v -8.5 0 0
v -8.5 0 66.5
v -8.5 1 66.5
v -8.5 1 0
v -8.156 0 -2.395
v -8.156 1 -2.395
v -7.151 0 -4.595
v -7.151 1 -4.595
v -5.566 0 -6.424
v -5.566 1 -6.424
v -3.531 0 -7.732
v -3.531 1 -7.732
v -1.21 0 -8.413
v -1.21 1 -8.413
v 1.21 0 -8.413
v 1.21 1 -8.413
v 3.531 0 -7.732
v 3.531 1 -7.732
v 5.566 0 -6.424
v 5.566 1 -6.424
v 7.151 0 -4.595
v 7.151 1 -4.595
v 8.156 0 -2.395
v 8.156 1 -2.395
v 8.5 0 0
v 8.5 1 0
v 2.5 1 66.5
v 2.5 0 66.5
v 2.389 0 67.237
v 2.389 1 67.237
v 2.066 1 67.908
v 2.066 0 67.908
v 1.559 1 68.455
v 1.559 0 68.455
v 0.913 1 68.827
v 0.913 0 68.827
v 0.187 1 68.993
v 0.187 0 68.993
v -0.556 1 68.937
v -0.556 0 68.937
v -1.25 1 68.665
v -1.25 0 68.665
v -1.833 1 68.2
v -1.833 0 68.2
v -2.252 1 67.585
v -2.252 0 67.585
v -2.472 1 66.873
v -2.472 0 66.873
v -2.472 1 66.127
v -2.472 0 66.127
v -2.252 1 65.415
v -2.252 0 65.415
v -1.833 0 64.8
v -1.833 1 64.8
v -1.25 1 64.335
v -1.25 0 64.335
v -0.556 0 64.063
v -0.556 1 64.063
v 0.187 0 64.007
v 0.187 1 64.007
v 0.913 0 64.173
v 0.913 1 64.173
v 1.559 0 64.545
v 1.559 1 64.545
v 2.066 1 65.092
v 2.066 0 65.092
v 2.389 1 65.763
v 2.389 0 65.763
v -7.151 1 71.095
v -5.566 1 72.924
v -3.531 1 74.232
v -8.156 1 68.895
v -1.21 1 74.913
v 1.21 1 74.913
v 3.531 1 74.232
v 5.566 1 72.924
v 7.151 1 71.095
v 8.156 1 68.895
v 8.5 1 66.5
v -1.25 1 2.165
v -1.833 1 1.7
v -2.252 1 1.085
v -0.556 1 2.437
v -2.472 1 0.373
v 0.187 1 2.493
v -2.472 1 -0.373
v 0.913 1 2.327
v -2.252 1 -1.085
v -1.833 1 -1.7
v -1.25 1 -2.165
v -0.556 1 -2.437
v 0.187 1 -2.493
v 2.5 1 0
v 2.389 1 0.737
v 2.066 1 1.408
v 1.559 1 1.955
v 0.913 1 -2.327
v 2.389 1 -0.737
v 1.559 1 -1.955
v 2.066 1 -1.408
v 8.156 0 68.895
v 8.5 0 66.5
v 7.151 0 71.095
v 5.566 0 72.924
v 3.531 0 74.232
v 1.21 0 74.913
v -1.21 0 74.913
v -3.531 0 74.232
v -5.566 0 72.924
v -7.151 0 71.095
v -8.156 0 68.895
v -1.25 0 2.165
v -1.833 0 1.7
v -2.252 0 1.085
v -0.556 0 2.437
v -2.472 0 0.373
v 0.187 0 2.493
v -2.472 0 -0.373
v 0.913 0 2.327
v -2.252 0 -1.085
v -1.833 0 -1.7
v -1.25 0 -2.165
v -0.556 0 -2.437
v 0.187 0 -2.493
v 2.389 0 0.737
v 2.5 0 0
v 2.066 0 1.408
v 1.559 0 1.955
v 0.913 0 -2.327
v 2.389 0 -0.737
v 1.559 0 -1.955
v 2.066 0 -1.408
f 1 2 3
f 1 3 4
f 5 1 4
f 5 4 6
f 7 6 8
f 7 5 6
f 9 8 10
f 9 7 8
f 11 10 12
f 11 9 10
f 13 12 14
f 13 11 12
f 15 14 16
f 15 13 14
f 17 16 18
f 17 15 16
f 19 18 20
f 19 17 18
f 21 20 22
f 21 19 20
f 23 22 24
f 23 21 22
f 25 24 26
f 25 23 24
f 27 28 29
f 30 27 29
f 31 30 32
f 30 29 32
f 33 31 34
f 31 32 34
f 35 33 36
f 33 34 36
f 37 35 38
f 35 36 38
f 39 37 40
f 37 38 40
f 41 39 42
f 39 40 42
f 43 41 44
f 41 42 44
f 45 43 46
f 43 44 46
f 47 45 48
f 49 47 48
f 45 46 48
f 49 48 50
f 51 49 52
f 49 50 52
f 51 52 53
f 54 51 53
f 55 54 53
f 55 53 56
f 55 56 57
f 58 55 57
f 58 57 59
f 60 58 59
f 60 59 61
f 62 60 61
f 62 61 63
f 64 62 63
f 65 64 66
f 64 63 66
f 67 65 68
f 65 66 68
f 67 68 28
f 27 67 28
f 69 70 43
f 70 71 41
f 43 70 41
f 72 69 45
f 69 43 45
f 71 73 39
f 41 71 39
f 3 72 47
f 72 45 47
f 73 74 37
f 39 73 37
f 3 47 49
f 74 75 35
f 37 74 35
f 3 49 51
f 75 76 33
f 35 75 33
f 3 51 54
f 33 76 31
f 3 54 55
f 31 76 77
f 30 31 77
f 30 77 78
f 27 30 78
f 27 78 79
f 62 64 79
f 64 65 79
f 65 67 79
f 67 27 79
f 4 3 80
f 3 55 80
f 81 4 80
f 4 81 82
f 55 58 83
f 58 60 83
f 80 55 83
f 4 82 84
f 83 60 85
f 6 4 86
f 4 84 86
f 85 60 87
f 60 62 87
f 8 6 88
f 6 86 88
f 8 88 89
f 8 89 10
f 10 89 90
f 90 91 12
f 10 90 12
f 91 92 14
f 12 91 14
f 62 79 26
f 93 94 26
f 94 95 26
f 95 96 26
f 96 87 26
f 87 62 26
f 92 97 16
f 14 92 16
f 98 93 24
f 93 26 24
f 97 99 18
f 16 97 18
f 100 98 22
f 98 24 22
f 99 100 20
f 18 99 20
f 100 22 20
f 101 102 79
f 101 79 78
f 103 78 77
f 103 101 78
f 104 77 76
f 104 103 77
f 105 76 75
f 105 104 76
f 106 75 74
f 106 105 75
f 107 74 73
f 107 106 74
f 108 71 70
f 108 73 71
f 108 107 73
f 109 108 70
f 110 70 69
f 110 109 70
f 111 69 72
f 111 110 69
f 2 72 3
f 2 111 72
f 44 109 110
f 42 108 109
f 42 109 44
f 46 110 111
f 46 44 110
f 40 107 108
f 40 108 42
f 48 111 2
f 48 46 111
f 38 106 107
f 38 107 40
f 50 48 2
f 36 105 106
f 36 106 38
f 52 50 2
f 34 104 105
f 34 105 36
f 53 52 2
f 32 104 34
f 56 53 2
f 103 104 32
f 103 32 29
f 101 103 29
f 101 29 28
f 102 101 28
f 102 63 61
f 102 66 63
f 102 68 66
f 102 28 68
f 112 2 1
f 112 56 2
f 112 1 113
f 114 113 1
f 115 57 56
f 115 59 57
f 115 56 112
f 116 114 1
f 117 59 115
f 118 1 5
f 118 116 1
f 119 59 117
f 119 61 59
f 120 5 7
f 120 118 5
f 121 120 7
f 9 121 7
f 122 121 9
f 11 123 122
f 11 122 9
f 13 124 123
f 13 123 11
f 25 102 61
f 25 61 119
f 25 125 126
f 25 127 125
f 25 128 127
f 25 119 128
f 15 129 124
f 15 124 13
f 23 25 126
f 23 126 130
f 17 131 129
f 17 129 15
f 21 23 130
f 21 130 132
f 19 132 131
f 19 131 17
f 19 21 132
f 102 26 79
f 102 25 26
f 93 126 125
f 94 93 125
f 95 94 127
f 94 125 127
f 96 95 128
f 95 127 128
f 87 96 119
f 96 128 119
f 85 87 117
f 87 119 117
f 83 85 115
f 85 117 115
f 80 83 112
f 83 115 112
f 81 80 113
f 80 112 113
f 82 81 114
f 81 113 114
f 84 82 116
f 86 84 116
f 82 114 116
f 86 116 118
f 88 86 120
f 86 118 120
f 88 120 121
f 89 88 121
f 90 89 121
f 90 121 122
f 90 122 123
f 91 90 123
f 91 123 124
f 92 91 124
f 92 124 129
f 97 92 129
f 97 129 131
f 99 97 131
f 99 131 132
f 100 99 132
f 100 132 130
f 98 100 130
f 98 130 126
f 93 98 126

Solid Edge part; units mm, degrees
sketch "Sketch1" plane through (0, 0, 0) normal (0, -1, 0) x (1, 0, 0)
  line L0 (8.5, 0) -> (8.5, 66.5)
  line L1 (-8.5, 66.5) -> (-8.5, 0)
  arc A0 (-8.5, 66.5) -> (8.5, 66.5) centre (0, 66.5) cw
  arc A1 (8.5, 0) -> (-8.5, 0) centre (0, 0) cw
  circle A2 centre (0, 66.5) radius 2.5
  circle A3 centre (0, 0) radius 2.5
extrude "Protrusion1" add sketch "Sketch1" against normal blind 1
